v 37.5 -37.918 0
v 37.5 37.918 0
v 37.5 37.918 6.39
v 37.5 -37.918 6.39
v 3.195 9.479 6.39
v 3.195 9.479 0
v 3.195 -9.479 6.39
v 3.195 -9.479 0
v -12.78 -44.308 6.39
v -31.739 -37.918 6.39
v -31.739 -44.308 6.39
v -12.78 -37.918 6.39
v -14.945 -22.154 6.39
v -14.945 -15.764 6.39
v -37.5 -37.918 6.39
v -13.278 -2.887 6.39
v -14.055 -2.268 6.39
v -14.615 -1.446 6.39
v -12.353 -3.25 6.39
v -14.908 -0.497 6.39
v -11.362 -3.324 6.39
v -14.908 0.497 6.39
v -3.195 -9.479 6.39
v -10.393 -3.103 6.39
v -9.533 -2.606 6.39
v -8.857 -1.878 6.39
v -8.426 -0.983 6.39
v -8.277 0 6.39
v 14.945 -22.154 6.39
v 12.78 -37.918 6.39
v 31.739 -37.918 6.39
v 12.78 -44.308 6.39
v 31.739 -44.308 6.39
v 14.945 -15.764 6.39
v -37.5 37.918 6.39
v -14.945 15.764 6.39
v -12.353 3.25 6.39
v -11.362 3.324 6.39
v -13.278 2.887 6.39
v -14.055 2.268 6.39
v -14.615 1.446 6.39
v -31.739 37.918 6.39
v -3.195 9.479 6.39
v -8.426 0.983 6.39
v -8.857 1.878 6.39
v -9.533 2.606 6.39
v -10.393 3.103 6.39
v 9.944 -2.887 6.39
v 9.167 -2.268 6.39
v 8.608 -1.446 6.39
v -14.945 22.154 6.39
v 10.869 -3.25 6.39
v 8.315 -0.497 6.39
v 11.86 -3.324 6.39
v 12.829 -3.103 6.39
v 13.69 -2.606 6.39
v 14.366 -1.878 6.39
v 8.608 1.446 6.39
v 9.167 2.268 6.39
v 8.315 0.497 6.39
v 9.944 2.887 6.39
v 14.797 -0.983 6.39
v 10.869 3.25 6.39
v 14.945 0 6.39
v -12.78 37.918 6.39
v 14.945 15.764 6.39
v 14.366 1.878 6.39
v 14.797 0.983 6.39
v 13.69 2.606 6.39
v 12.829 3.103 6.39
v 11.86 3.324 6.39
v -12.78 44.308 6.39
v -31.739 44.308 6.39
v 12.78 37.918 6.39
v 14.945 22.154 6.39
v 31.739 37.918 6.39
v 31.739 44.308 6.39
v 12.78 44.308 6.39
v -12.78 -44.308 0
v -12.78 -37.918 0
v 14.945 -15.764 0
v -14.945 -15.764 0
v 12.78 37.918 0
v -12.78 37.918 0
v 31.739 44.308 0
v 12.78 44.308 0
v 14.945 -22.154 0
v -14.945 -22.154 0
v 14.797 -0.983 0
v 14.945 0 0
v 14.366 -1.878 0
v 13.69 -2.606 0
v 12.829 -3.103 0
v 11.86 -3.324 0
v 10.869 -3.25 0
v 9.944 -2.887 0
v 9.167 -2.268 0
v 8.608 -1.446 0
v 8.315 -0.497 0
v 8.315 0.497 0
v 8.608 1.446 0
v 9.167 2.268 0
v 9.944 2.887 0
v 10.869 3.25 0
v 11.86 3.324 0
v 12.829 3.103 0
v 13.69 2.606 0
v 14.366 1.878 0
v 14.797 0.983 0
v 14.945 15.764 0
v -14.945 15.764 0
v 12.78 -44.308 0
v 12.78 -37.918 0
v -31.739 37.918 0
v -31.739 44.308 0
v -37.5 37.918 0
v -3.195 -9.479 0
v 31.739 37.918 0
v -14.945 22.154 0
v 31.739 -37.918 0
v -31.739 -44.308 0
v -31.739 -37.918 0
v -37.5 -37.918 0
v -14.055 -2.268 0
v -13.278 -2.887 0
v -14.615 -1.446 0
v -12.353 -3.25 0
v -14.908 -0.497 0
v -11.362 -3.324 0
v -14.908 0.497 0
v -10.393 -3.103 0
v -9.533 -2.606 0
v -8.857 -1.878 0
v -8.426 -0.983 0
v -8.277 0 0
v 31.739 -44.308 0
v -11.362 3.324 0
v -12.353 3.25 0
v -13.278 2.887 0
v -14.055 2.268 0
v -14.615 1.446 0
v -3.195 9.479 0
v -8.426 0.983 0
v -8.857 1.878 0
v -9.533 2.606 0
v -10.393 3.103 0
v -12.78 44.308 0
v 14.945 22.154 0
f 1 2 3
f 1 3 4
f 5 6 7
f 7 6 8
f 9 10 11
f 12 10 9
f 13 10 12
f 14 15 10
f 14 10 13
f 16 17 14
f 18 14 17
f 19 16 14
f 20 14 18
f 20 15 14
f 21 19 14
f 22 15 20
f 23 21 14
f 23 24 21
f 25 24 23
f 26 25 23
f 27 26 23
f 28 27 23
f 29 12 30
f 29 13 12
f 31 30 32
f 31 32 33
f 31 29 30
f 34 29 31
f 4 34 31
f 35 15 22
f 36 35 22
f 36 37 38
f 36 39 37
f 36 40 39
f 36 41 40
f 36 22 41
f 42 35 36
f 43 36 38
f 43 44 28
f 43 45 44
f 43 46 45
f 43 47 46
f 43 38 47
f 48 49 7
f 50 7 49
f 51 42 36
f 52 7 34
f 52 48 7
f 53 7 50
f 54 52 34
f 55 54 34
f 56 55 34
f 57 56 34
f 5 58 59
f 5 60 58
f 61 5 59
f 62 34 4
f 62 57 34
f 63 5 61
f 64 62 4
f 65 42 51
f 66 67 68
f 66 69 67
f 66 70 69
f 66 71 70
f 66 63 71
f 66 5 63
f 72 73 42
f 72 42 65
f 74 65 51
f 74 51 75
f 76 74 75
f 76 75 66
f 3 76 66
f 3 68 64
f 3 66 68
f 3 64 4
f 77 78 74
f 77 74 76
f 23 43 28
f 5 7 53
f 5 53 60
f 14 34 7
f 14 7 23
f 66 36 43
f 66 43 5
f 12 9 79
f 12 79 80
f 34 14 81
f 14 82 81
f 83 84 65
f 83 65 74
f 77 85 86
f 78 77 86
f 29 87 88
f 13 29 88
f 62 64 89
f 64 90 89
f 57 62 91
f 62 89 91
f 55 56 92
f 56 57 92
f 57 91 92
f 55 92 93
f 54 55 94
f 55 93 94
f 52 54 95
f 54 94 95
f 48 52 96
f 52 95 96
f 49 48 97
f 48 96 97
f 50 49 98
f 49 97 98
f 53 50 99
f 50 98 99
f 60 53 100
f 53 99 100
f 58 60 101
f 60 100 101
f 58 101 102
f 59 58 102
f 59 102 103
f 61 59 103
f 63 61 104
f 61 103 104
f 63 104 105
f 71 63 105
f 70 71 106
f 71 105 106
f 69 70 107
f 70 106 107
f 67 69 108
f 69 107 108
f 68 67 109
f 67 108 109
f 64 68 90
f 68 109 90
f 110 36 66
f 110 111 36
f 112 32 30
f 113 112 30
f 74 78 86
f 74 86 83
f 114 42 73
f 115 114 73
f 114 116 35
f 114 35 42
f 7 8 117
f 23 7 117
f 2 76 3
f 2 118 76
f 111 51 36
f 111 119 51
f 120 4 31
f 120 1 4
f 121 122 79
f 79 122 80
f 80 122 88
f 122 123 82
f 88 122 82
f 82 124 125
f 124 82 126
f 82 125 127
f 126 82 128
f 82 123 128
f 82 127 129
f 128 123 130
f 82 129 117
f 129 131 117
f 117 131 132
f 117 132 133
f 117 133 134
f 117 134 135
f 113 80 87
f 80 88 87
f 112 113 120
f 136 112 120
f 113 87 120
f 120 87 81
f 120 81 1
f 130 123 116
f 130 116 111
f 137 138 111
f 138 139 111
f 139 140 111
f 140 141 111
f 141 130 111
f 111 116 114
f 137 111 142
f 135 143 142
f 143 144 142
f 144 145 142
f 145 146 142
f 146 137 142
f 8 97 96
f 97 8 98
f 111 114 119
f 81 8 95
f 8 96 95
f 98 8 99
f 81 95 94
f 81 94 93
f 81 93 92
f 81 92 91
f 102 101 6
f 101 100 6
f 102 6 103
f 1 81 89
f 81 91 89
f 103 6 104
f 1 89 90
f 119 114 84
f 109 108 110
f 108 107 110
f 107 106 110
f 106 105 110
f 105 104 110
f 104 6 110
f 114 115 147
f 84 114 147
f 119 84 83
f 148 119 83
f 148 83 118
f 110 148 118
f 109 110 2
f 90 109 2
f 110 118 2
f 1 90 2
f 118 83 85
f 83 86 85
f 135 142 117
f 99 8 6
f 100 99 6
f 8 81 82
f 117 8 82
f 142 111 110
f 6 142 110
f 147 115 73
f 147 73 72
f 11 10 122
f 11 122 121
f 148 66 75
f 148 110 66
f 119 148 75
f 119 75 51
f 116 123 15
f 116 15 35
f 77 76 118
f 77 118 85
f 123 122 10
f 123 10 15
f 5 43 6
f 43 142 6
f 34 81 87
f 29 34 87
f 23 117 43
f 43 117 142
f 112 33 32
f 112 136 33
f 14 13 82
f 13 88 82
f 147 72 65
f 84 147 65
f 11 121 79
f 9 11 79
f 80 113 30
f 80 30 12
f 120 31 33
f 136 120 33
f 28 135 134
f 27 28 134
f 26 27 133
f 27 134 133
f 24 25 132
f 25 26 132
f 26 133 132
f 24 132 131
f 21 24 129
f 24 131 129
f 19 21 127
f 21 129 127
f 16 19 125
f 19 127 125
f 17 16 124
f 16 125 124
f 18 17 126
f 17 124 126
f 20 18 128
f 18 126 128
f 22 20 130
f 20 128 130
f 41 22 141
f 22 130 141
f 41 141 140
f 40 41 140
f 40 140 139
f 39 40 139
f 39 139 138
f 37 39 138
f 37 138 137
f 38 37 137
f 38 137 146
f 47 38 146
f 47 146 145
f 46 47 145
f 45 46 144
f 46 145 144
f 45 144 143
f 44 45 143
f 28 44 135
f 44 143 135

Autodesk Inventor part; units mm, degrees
ref_plane "YZ Plane" through (0, 0, 0) normal (1, 0, 0) x (0, 1, 0)
ref_plane "XZ Plane" through (0, 0, 0) normal (0, 1, 0) x (-1, 0, 0)
ref_plane "XY Plane" through (0, 0, 0) normal (0, 0, 1) x (1, 0, 0)
sketch "Sketch1" plane through (0, 0, 0) normal (0, 0, 1) x (1, 0, 0)
  line L0 (-37.5, 37.9177) -> (-31.7388, 37.9177)
  line L1 (37.5, 37.9177) -> (37.5, -37.9177)
  line L2 (37.5, -37.9177) -> (31.7388, -37.9177)
  line L3 (-37.5, -37.9177) -> (-37.5, 37.9177)
  line L4 (-31.7388, 37.9177) -> (-31.7388, 44.3077)
  line L5 (-31.7388, 44.3077) -> (-12.78, 44.3077)
  line L6 (-12.78, 44.3077) -> (-12.78, 37.9177)
  line L7 (0, 37.9177) -> (0, -37.9177) construction
  line L8 (-37.5, 0) -> (37.5, 0) construction
  line L9 (-12.78, 37.9177) -> (12.78, 37.9177)
  line L10 (31.7388, 37.9177) -> (31.7388, 44.3077)
  line L11 (31.7388, 44.3077) -> (12.78, 44.3077)
  line L12 (12.78, 44.3077) -> (12.78, 37.9177)
  line L13 (-31.7388, -37.9177) -> (-31.7388, -44.3077)
  line L14 (-31.7388, -44.3077) -> (-12.78, -44.3077)
  line L15 (-12.78, -44.3077) -> (-12.78, -37.9177)
  line L16 (12.78, -44.3077) -> (12.78, -37.9177)
  line L17 (31.7388, -44.3077) -> (12.78, -44.3077)
  line L18 (31.7388, -37.9177) -> (31.7388, -44.3077)
  line L19 (31.7388, 37.9177) -> (37.5, 37.9177)
  line L20 (-31.7388, -37.9177) -> (-37.5, -37.9177)
  line L21 (12.78, -37.9177) -> (-12.78, -37.9177)
  line L22 (-14.945, 15.7638) -> (14.945, 15.7638)
  line L23 (14.945, 15.7638) -> (14.945, 22.1538)
  line L24 (14.945, 22.1538) -> (-14.945, 22.1538)
  line L25 (-14.945, 22.1538) -> (-14.945, 15.7638)
  line L26 (-14.945, -15.7638) -> (14.945, -15.7638)
  line L27 (14.945, -15.7638) -> (14.945, -22.1538)
  line L28 (14.945, -22.1538) -> (-14.945, -22.1538)
  line L29 (-14.945, -22.1538) -> (-14.945, -15.7638)
  line L30 (-3.195, 9.4794) -> (3.195, 9.4794)
  line L31 (3.195, 9.4794) -> (3.195, -9.4794)
  line L32 (3.195, -9.4794) -> (-3.195, -9.4794)
  line L33 (-3.195, -9.4794) -> (-3.195, 9.4794)
  line L34 (-14.945, 18.9588) -> (14.945, 18.9588) construction
  circle A0 centre (-11.6112, 0) radius 3.3338
  circle A1 centre (11.6112, 0) radius 3.3338
  point P0 (0, 0)
  point P1 (0, 22.1538)
  point P2 (3.195, 0)
  point P3 (0, 0)
  point P4 (0, 9.4794)
  point P5 (0, 0)
  point P6 (-22.2594, -44.3077)
  dimension "d0" = 75
  dimension "d1" = 75.8353
  dimension "d2" = 18.9588
  dimension "d3" = 6.39
  dimension "d4" = 12.78
  dimension "d21" = 6.39
  dimension "d22" = 29.89
  dimension "d24" = 18.9588
  dimension "d25" = 6.39
  dimension "d30" = 37.9177
  dimension "d41" = 6.6675
extrude "Extrusion4" add sketch "Sketch1" along normal blind 6.39
equation "\"d1\" = DiskGap"
equation "\"d2\" = 0.25 * DiskGap"
equation "\"d3\" = WoodThickness"
equation "\"d4\" = 2 * WoodThickness"
equation "\"d21\" = WoodThickness"
equation "\"d22\" = 0.5 * ColumnWidth"
equation "\"d24\" = 0.25 * DiskGap"
equation "\"d25\" = WoodThickness"
equation "\"d30\" = 0.5 * DiskGap"
equation "\"d42\" = WoodThickness"
equation "\"DiskGap\" = 75.835317"
equation "\"WoodThickness\" = 6.39"
equation "\"ColumnWidth\" = 59.78"
properties part number "LightDiskSupport" material "MDF Medium Density Fiberboard"
